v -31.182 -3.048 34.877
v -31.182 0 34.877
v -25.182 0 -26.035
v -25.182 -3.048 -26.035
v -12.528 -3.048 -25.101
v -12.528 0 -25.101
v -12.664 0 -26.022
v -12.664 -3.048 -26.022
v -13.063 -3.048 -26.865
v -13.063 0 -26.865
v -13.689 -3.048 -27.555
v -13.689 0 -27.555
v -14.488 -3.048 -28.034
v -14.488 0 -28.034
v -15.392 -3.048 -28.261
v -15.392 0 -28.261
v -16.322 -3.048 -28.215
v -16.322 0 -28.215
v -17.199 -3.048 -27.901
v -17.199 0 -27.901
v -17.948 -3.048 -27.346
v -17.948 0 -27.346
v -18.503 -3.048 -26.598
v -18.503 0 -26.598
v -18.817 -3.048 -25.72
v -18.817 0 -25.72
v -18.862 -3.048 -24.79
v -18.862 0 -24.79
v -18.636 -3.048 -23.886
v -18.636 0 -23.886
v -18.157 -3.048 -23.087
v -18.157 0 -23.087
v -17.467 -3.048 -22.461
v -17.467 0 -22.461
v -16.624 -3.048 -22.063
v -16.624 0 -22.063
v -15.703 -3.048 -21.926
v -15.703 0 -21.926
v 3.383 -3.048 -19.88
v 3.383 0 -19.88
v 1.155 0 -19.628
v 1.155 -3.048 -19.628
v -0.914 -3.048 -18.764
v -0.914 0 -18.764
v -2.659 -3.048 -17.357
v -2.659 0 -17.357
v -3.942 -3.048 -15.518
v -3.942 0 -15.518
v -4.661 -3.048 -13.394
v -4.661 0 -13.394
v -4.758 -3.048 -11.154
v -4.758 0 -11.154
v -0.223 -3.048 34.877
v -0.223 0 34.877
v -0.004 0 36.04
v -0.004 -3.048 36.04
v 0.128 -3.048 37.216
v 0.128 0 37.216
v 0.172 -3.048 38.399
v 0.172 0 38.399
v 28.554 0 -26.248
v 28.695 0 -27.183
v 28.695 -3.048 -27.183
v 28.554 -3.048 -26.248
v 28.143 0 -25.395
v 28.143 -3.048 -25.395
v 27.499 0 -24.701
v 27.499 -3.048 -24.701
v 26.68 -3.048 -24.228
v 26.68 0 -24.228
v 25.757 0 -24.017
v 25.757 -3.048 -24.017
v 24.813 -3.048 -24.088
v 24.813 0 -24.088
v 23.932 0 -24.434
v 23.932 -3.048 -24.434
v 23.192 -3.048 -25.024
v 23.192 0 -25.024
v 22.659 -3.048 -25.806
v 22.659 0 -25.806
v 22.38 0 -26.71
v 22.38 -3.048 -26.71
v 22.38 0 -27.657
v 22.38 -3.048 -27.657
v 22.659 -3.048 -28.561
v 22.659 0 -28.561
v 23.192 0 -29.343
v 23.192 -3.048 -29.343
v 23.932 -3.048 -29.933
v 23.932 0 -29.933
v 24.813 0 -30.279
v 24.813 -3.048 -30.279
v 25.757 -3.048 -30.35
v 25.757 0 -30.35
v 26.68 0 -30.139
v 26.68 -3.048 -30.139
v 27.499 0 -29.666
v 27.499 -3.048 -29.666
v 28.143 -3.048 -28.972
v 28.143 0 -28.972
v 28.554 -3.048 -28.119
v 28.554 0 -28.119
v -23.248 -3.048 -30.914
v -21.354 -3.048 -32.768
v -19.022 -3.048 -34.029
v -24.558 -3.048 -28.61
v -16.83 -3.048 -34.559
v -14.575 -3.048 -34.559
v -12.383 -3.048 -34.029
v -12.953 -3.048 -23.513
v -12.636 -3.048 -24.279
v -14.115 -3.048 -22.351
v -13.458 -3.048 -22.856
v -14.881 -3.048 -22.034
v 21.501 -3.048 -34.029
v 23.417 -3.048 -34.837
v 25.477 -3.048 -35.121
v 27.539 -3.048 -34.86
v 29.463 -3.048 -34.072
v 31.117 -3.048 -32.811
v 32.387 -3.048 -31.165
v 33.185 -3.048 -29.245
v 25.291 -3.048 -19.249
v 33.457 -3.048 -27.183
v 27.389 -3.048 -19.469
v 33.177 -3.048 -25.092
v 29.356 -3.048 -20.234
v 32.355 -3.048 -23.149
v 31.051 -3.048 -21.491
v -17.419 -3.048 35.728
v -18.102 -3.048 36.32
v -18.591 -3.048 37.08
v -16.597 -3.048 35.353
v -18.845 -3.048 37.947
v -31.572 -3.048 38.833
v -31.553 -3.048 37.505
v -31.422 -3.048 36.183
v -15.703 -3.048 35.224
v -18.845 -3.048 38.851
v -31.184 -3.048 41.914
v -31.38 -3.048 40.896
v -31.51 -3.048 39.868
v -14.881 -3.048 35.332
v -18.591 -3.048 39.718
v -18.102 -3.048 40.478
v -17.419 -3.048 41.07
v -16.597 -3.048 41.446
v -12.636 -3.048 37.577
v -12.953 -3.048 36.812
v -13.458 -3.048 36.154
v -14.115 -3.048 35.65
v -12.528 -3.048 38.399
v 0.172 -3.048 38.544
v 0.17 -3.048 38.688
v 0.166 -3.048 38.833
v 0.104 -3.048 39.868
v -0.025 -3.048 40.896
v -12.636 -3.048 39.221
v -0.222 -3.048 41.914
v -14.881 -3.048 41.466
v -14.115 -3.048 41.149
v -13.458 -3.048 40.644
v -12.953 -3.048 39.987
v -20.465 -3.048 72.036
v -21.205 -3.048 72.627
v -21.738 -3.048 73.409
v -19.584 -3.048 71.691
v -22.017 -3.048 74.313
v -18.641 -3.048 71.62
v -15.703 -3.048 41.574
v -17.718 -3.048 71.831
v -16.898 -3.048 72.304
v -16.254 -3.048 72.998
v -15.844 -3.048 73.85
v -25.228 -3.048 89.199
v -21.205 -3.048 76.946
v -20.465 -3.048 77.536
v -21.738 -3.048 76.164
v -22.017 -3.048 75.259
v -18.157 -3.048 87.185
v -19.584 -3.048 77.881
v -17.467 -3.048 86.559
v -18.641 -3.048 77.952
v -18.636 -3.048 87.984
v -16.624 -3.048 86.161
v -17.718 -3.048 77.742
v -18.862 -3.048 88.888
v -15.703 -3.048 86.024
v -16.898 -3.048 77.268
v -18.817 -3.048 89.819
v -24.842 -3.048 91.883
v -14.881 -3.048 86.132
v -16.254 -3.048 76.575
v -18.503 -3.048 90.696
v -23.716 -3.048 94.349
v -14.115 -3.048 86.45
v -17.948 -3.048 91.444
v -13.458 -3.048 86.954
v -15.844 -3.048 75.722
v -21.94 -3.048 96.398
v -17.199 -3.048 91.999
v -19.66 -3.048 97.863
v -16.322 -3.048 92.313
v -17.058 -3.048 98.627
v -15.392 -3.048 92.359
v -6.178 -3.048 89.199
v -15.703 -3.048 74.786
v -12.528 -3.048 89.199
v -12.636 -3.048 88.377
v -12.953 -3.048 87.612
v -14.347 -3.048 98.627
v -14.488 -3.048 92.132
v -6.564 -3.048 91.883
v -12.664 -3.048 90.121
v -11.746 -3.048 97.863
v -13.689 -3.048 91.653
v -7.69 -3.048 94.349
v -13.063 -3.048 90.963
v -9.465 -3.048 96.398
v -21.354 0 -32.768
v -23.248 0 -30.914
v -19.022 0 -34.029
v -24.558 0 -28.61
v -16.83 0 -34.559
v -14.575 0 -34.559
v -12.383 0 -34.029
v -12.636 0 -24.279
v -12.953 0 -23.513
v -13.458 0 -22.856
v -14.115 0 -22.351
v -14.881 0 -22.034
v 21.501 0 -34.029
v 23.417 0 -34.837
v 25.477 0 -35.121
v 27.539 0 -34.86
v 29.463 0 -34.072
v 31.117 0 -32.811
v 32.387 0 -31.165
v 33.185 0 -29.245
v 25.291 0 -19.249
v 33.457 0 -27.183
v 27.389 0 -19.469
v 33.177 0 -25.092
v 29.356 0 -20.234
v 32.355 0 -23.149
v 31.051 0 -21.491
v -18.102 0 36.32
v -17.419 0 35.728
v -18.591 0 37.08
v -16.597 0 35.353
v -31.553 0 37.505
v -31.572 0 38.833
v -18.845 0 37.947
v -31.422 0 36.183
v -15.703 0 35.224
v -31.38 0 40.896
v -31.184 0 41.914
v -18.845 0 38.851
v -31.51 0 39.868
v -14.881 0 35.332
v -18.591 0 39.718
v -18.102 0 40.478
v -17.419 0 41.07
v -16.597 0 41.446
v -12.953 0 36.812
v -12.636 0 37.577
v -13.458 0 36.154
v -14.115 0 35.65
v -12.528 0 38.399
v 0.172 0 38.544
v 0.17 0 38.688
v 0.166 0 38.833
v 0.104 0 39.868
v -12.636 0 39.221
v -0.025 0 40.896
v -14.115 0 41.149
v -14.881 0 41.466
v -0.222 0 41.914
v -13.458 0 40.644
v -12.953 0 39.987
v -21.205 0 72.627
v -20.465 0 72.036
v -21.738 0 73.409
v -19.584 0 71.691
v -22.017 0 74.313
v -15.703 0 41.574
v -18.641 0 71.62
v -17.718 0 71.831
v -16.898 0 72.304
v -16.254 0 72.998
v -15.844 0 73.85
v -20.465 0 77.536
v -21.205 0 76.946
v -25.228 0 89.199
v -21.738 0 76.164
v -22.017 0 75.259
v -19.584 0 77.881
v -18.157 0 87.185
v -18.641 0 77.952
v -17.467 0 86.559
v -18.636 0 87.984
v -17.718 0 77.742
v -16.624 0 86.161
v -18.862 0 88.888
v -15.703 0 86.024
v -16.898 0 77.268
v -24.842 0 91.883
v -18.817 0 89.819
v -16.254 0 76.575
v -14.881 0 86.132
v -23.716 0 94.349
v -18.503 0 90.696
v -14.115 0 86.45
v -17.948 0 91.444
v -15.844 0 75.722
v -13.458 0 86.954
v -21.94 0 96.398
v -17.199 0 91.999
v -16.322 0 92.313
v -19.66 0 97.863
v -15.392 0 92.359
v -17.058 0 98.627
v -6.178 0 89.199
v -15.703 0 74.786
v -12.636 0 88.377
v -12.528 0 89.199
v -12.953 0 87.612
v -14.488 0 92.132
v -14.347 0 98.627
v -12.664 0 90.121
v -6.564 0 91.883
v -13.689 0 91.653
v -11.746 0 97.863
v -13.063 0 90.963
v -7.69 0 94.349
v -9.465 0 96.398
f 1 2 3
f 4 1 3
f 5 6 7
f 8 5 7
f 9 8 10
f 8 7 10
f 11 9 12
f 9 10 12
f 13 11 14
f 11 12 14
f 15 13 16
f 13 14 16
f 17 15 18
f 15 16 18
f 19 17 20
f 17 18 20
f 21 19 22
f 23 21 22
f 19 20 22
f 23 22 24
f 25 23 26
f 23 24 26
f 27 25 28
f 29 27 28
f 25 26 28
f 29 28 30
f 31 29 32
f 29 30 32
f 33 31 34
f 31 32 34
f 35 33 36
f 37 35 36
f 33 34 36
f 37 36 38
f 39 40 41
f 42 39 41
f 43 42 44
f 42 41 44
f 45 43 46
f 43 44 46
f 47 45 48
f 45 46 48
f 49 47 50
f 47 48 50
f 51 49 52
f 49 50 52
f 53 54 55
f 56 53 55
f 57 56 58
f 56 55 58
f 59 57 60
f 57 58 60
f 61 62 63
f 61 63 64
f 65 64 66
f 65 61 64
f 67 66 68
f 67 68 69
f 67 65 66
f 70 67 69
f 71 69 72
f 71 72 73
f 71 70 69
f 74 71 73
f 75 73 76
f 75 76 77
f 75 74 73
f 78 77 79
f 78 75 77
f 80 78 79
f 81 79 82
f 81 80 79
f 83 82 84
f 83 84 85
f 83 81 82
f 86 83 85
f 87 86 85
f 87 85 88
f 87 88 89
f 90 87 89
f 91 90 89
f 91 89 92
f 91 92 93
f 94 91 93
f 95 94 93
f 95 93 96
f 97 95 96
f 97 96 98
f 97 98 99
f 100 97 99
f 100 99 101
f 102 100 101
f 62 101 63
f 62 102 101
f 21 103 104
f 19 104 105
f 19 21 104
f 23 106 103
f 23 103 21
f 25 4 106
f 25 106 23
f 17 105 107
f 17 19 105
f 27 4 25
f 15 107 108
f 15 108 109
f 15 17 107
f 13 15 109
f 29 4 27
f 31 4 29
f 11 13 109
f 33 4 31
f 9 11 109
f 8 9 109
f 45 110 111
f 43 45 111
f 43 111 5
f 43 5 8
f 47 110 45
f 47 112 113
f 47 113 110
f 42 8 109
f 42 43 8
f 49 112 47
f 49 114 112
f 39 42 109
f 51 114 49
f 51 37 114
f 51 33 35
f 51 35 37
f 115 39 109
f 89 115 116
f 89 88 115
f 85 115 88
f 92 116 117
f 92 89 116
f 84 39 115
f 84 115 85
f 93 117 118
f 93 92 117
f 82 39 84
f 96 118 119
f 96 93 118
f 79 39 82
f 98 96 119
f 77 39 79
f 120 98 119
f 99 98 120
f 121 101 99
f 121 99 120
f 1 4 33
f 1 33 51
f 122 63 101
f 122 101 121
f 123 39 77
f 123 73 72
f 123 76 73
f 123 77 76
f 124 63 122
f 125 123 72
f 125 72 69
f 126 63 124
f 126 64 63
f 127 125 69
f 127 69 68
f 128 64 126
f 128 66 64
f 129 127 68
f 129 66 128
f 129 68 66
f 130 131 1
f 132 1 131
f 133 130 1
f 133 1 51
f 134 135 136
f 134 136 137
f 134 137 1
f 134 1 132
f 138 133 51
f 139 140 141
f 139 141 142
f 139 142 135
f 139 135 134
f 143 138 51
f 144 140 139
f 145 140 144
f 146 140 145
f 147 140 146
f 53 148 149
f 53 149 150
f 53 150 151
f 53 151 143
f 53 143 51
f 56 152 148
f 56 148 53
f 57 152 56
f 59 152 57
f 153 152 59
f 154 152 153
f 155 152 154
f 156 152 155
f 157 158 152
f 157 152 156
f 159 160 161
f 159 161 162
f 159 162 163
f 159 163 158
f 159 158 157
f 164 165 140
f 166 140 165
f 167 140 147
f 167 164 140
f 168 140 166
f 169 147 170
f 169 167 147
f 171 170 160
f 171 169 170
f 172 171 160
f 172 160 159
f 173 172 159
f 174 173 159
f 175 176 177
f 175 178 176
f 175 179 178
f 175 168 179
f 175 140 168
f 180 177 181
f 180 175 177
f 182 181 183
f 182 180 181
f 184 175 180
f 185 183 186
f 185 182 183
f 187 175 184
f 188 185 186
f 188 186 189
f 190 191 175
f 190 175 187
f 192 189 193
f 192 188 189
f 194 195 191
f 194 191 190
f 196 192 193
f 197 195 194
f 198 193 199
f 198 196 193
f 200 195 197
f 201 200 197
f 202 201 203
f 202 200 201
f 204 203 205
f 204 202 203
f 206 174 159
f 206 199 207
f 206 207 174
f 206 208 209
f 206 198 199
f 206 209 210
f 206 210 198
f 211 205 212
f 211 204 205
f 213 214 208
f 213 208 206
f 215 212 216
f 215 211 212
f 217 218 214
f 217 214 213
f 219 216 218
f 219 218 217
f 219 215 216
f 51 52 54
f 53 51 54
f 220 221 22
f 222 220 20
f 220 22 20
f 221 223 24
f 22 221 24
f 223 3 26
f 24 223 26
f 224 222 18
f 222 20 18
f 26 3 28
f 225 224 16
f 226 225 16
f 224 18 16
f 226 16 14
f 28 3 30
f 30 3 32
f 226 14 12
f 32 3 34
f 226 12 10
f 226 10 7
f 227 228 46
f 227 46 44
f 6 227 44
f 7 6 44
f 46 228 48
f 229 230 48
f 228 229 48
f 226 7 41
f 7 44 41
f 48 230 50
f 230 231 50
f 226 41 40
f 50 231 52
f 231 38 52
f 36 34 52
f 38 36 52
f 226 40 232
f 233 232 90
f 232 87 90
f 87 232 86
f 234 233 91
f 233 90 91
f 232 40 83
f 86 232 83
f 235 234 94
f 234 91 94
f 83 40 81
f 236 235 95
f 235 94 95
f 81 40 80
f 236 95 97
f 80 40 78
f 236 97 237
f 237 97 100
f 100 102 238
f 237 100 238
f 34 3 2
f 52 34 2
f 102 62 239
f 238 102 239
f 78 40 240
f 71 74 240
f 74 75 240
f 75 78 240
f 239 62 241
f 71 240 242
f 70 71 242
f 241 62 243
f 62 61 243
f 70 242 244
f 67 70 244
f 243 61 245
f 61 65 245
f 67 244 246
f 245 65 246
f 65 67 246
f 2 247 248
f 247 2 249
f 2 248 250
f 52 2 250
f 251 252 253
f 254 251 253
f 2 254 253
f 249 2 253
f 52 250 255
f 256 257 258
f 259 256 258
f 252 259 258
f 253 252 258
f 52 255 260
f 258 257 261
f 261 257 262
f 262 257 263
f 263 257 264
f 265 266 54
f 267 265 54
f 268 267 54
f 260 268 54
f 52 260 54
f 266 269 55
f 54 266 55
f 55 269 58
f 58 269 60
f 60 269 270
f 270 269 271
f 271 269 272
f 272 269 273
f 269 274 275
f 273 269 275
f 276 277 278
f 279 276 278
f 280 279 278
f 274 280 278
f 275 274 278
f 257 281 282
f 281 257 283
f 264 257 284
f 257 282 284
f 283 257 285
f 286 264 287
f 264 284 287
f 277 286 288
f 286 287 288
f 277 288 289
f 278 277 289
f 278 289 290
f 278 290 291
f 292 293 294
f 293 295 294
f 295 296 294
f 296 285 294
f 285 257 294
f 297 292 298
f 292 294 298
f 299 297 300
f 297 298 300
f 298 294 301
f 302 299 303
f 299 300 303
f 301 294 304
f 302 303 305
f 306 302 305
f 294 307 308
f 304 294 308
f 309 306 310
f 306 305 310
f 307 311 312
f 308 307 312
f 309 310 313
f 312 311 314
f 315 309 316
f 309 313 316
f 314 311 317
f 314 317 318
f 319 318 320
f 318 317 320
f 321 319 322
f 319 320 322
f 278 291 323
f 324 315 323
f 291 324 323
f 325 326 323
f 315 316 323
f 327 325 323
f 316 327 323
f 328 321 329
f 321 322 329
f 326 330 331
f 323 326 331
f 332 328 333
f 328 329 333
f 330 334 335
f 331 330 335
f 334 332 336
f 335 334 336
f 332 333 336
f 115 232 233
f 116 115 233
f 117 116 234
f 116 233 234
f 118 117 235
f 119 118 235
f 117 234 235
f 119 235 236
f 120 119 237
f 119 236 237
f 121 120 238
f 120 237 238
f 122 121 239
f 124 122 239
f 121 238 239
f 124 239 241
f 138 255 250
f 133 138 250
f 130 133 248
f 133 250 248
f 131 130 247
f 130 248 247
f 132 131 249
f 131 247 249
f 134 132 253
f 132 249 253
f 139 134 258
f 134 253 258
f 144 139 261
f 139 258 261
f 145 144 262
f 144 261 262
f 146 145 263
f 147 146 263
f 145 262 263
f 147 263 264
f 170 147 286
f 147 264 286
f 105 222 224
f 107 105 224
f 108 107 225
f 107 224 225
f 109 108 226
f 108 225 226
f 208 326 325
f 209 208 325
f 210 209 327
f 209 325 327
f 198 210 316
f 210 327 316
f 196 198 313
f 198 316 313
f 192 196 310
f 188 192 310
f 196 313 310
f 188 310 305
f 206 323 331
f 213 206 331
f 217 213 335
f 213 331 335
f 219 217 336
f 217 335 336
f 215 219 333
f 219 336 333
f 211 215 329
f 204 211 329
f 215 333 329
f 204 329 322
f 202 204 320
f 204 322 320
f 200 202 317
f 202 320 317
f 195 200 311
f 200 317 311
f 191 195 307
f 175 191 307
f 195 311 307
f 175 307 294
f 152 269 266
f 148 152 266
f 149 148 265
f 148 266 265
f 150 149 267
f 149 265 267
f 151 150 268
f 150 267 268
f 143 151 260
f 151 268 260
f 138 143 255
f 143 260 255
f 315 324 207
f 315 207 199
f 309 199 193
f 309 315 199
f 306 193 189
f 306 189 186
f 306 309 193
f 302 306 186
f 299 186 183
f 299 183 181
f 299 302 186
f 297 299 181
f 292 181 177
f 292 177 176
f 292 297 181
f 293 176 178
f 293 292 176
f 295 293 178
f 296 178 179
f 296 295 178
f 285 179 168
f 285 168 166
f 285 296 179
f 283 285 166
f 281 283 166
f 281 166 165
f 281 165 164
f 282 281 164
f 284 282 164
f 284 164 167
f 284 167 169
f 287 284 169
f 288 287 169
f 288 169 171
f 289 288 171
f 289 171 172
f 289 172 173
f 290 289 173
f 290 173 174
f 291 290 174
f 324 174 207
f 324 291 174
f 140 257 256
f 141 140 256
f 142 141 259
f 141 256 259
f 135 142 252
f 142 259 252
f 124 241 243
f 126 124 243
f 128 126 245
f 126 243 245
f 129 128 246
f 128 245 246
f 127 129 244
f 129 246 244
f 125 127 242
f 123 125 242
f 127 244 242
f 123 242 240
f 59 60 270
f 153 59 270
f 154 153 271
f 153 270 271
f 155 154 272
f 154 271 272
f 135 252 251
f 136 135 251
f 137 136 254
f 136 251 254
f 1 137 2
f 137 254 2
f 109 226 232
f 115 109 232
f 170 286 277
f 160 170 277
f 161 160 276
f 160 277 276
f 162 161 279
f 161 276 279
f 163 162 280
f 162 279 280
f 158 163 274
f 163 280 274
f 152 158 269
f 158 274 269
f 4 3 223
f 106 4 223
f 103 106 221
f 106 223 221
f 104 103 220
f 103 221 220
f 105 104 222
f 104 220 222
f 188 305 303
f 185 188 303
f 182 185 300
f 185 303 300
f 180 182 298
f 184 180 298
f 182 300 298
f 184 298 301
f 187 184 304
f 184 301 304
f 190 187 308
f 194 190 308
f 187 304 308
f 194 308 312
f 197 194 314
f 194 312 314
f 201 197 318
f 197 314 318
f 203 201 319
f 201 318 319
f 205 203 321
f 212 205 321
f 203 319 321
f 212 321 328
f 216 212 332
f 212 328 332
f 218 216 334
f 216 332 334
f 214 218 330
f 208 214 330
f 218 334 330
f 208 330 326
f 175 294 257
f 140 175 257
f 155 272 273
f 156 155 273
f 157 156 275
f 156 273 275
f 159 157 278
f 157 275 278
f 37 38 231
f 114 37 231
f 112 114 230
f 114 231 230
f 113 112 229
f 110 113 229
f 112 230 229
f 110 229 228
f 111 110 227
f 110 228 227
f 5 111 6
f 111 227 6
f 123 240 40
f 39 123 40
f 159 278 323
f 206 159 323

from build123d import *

# Parameters (mm, degrees)
F0_R     = 3.175
F1_DEPTH = 3.048


# Not quite as in the source:
# - a feature names something its author has since deleted; it is built from what else it names


with BuildPart() as f1:
    # F0 (on Front) → F1 (new body)
    with BuildSketch(Plane.XZ):
        with BuildLine():
            ThreePointArc((-25.2277835988, 89.1991540504), (-22.4379756896, 82.4639619596), (-15.7027835988, 79.6741540504))
            ThreePointArc((-15.7027835988, 79.6741540504), (-8.967591508, 82.4639619596), (-6.1777835988, 89.1991540504))
            ThreePointArc((-6.1777835988, 89.1991540504), (-15.7027835988, 98.7241540504), (-25.2277835988, 89.1991540504))
        make_face()
        with BuildLine():
            ThreePointArc((-12.5277835988, 89.1991540504), (-13.4577195686, 86.9540900201), (-15.7027835988, 86.0241540504))
            ThreePointArc((-15.7027835988, 86.0241540504), (-17.9478476291, 91.4442180807), (-12.5277835988, 89.1991540504))
        make_face(mode=Mode.SUBTRACT)
        with BuildLine():
            ThreePointArc((-6.1777835988, 89.1991540504), (-8.967591508, 82.4639619596), (-15.7027835988, 79.6741540504))
            Line((-15.7027835988, 79.6741540504), (-15.7027835988, 74.7860969014))
            Line((-15.7027835988, 74.7860969014), (-15.7027835988, 54.2741540504))
            ThreePointArc((-15.7027835988, 54.2741540504), (-5.7978377346, 50.8051071547), (-0.2218016911, 41.9140970332))
            Line((-0.2218016911, 41.9140970332), (-6.1777835988, 89.1991540504))
        make_face()
        with BuildLine():
            Line((-15.7027835988, 74.7860969014), (-15.7027835988, 79.6741540504))
            ThreePointArc((-15.7027835988, 79.6741540504), (-22.4379756896, 82.4639619596), (-25.2277835988, 89.1991540504))
            Line((-25.2277835988, 89.1991540504), (-31.1837655066, 41.9140970332))
            ThreePointArc((-31.1837655066, 41.9140970332), (-25.6077294631, 50.8051071547), (-15.7027835988, 54.2741540504))
            Line((-15.7027835988, 54.2741540504), (-15.7027835988, 74.7860969014))
        make_face()
        with Locations((-18.8777835988, 74.7860969014)):
            Circle(F0_R, mode=Mode.SUBTRACT)
        with BuildLine():
            ThreePointArc((-0.2218016911, 41.9140970332), (-5.7978377346, 50.8051071547), (-15.7027835988, 54.2741540504))
            Line((-15.7027835988, 54.2741540504), (-15.7027835988, 41.5741540504))
            ThreePointArc((-15.7027835988, 41.5741540504), (-13.4577195686, 40.6442180807), (-12.5277835988, 38.3991540504))
            ThreePointArc((-12.5277835988, 38.3991540504), (-13.4577195686, 36.1540900201), (-15.7027835988, 35.2241540504))
            Line((-15.7027835988, 35.2241540504), (-15.7027835988, 22.5241540504))
            ThreePointArc((-15.7027835988, 22.5241540504), (-5.8006414211, 25.990962994), (-0.2233918497, 34.8772148011))
            Line((-0.2233918497, 34.8772148011), (0.1662860895, 38.8330344781))
            Line((0.1662860895, 38.8330344781), (-0.2218016911, 41.9140970332))
        make_face()
        with BuildLine():
            Line((-15.7027835988, 41.5741540504), (-15.7027835988, 54.2741540504))
            ThreePointArc((-15.7027835988, 54.2741540504), (-25.6077294631, 50.8051071547), (-31.1837655066, 41.9140970332))
            Line((-31.1837655066, 41.9140970332), (-31.5718532872, 38.8330344781))
            Line((-31.5718532872, 38.8330344781), (-31.182175348, 34.8772148011))
            ThreePointArc((-31.182175348, 34.8772148011), (-25.6049257766, 25.990962994), (-15.7027835988, 22.5241540504))
            Line((-15.7027835988, 22.5241540504), (-15.7027835988, 35.2241540504))
            ThreePointArc((-15.7027835988, 35.2241540504), (-18.8777835988, 38.3991540504), (-15.7027835988, 41.5741540504))
        make_face()
        with BuildLine():
            Line((-31.5718532872, 38.8330344781), (-31.1837655066, 41.9140970332))
            ThreePointArc((-31.1837655066, 41.9140970332), (-31.4533286811, 40.3830780946), (-31.5718532872, 38.8330344781))
        make_face()
        with BuildLine():
            ThreePointArc((0.1662860895, 38.8330344781), (0.0477614834, 40.3830780946), (-0.2218016911, 41.9140970332))
            Line((-0.2218016911, 41.9140970332), (0.1662860895, 38.8330344781))
        make_face()
        with BuildLine():
            Line((-31.182175348, 34.8772148011), (-31.5718532872, 38.8330344781))
            ThreePointArc((-31.5718532872, 38.8330344781), (-31.5013163141, 36.8428799596), (-31.182175348, 34.8772148011))
        make_face()
        with BuildLine():
            ThreePointArc((0.1722164012, 38.3991540504), (0.170733754, 38.6161145273), (0.1662860895, 38.8330344781))
            Line((0.1662860895, 38.8330344781), (-0.2233918497, 34.8772148011))
            ThreePointArc((-0.2233918497, 34.8772148011), (0.0730043216, 36.6271098943), (0.1722164012, 38.3991540504))
        make_face()
        with BuildLine():
            ThreePointArc((-15.7027835988, 22.5241540504), (-25.6049257766, 25.990962994), (-31.182175348, 34.8772148011))
            Line((-31.182175348, 34.8772148011), (-25.181903228, -26.034610404))
            ThreePointArc((-25.181903228, -26.034610404), (-22.7603940807, -18.7043031892), (-15.7027835988, -15.5758459496))
            Line((-15.7027835988, -15.5758459496), (-15.7027835988, 22.5241540504))
        make_face()
        with BuildLine():
            Line((-4.7578265809, -11.1541468152), (-0.2233918497, 34.8772148011))
            ThreePointArc((-0.2233918497, 34.8772148011), (-5.8006414211, 25.990962994), (-15.7027835988, 22.5241540504))
            Line((-15.7027835988, 22.5241540504), (-15.7027835988, -15.5758459496))
            ThreePointArc((-15.7027835988, -15.5758459496), (-8.967591508, -18.3656538588), (-6.1777835988, -25.1008459496))
            ThreePointArc((-6.1777835988, -25.1008459496), (-7.8814722685, -30.5370867531), (-12.3830778926, -34.0286216538))
            Line((-12.3830778926, -34.0286216538), (21.5012593326, -34.0286216538))
            ThreePointArc((21.5012593326, -34.0286216538), (17.8308984551, -25.2118628548), (25.291047986, -19.2492330938))
            Line((25.291047986, -19.2492330938), (3.3830391656, -19.8804312387))
            ThreePointArc((3.3830391656, -19.8804312387), (-2.6591751738, -17.3567899438), (-4.7578265809, -11.1541468152))
        make_face()
        with BuildLine():
            ThreePointArc((-15.7027835988, -15.5758459496), (-22.7603940807, -18.7043031892), (-25.181903228, -26.034610404))
            ThreePointArc((-25.181903228, -26.034610404), (-23.2478837609, -30.9143722928), (-19.022489305, -34.0286216538))
            Line((-19.022489305, -34.0286216538), (-12.3830778926, -34.0286216538))
            ThreePointArc((-12.3830778926, -34.0286216538), (-7.8814722685, -30.5370867531), (-6.1777835988, -25.1008459496))
            ThreePointArc((-6.1777835988, -25.1008459496), (-8.967591508, -18.3656538588), (-15.7027835988, -15.5758459496))
        make_face()
        with BuildLine():
            ThreePointArc((-12.5277835988, -25.1008459496), (-17.9478476291, -27.3459099799), (-15.7027835988, -21.9258459496))
            ThreePointArc((-15.7027835988, -21.9258459496), (-13.4577195686, -22.8557819193), (-12.5277835988, -25.1008459496))
        make_face(mode=Mode.SUBTRACT)
        with BuildLine():
            Line((-12.3830778926, -34.0286216538), (-19.022489305, -34.0286216538))
            ThreePointArc((-19.022489305, -34.0286216538), (-15.7027835988, -34.6258459496), (-12.3830778926, -34.0286216538))
        make_face()
        with BuildLine():
            ThreePointArc((33.4571426277, -27.1834407253), (31.0508918664, -21.4905339011), (25.291047986, -19.2492330938))
            ThreePointArc((25.291047986, -19.2492330938), (17.8308984551, -25.2118628548), (21.5012593326, -34.0286216538))
            ThreePointArc((21.5012593326, -34.0286216538), (29.4634979017, -34.0718303649), (33.4571426277, -27.1834407253))
        make_face()
        with Locations((25.5196426277, -27.1834407253)):
            Circle(F0_R, mode=Mode.SUBTRACT)
    extrude(amount=F1_DEPTH)


solid = f1.part
